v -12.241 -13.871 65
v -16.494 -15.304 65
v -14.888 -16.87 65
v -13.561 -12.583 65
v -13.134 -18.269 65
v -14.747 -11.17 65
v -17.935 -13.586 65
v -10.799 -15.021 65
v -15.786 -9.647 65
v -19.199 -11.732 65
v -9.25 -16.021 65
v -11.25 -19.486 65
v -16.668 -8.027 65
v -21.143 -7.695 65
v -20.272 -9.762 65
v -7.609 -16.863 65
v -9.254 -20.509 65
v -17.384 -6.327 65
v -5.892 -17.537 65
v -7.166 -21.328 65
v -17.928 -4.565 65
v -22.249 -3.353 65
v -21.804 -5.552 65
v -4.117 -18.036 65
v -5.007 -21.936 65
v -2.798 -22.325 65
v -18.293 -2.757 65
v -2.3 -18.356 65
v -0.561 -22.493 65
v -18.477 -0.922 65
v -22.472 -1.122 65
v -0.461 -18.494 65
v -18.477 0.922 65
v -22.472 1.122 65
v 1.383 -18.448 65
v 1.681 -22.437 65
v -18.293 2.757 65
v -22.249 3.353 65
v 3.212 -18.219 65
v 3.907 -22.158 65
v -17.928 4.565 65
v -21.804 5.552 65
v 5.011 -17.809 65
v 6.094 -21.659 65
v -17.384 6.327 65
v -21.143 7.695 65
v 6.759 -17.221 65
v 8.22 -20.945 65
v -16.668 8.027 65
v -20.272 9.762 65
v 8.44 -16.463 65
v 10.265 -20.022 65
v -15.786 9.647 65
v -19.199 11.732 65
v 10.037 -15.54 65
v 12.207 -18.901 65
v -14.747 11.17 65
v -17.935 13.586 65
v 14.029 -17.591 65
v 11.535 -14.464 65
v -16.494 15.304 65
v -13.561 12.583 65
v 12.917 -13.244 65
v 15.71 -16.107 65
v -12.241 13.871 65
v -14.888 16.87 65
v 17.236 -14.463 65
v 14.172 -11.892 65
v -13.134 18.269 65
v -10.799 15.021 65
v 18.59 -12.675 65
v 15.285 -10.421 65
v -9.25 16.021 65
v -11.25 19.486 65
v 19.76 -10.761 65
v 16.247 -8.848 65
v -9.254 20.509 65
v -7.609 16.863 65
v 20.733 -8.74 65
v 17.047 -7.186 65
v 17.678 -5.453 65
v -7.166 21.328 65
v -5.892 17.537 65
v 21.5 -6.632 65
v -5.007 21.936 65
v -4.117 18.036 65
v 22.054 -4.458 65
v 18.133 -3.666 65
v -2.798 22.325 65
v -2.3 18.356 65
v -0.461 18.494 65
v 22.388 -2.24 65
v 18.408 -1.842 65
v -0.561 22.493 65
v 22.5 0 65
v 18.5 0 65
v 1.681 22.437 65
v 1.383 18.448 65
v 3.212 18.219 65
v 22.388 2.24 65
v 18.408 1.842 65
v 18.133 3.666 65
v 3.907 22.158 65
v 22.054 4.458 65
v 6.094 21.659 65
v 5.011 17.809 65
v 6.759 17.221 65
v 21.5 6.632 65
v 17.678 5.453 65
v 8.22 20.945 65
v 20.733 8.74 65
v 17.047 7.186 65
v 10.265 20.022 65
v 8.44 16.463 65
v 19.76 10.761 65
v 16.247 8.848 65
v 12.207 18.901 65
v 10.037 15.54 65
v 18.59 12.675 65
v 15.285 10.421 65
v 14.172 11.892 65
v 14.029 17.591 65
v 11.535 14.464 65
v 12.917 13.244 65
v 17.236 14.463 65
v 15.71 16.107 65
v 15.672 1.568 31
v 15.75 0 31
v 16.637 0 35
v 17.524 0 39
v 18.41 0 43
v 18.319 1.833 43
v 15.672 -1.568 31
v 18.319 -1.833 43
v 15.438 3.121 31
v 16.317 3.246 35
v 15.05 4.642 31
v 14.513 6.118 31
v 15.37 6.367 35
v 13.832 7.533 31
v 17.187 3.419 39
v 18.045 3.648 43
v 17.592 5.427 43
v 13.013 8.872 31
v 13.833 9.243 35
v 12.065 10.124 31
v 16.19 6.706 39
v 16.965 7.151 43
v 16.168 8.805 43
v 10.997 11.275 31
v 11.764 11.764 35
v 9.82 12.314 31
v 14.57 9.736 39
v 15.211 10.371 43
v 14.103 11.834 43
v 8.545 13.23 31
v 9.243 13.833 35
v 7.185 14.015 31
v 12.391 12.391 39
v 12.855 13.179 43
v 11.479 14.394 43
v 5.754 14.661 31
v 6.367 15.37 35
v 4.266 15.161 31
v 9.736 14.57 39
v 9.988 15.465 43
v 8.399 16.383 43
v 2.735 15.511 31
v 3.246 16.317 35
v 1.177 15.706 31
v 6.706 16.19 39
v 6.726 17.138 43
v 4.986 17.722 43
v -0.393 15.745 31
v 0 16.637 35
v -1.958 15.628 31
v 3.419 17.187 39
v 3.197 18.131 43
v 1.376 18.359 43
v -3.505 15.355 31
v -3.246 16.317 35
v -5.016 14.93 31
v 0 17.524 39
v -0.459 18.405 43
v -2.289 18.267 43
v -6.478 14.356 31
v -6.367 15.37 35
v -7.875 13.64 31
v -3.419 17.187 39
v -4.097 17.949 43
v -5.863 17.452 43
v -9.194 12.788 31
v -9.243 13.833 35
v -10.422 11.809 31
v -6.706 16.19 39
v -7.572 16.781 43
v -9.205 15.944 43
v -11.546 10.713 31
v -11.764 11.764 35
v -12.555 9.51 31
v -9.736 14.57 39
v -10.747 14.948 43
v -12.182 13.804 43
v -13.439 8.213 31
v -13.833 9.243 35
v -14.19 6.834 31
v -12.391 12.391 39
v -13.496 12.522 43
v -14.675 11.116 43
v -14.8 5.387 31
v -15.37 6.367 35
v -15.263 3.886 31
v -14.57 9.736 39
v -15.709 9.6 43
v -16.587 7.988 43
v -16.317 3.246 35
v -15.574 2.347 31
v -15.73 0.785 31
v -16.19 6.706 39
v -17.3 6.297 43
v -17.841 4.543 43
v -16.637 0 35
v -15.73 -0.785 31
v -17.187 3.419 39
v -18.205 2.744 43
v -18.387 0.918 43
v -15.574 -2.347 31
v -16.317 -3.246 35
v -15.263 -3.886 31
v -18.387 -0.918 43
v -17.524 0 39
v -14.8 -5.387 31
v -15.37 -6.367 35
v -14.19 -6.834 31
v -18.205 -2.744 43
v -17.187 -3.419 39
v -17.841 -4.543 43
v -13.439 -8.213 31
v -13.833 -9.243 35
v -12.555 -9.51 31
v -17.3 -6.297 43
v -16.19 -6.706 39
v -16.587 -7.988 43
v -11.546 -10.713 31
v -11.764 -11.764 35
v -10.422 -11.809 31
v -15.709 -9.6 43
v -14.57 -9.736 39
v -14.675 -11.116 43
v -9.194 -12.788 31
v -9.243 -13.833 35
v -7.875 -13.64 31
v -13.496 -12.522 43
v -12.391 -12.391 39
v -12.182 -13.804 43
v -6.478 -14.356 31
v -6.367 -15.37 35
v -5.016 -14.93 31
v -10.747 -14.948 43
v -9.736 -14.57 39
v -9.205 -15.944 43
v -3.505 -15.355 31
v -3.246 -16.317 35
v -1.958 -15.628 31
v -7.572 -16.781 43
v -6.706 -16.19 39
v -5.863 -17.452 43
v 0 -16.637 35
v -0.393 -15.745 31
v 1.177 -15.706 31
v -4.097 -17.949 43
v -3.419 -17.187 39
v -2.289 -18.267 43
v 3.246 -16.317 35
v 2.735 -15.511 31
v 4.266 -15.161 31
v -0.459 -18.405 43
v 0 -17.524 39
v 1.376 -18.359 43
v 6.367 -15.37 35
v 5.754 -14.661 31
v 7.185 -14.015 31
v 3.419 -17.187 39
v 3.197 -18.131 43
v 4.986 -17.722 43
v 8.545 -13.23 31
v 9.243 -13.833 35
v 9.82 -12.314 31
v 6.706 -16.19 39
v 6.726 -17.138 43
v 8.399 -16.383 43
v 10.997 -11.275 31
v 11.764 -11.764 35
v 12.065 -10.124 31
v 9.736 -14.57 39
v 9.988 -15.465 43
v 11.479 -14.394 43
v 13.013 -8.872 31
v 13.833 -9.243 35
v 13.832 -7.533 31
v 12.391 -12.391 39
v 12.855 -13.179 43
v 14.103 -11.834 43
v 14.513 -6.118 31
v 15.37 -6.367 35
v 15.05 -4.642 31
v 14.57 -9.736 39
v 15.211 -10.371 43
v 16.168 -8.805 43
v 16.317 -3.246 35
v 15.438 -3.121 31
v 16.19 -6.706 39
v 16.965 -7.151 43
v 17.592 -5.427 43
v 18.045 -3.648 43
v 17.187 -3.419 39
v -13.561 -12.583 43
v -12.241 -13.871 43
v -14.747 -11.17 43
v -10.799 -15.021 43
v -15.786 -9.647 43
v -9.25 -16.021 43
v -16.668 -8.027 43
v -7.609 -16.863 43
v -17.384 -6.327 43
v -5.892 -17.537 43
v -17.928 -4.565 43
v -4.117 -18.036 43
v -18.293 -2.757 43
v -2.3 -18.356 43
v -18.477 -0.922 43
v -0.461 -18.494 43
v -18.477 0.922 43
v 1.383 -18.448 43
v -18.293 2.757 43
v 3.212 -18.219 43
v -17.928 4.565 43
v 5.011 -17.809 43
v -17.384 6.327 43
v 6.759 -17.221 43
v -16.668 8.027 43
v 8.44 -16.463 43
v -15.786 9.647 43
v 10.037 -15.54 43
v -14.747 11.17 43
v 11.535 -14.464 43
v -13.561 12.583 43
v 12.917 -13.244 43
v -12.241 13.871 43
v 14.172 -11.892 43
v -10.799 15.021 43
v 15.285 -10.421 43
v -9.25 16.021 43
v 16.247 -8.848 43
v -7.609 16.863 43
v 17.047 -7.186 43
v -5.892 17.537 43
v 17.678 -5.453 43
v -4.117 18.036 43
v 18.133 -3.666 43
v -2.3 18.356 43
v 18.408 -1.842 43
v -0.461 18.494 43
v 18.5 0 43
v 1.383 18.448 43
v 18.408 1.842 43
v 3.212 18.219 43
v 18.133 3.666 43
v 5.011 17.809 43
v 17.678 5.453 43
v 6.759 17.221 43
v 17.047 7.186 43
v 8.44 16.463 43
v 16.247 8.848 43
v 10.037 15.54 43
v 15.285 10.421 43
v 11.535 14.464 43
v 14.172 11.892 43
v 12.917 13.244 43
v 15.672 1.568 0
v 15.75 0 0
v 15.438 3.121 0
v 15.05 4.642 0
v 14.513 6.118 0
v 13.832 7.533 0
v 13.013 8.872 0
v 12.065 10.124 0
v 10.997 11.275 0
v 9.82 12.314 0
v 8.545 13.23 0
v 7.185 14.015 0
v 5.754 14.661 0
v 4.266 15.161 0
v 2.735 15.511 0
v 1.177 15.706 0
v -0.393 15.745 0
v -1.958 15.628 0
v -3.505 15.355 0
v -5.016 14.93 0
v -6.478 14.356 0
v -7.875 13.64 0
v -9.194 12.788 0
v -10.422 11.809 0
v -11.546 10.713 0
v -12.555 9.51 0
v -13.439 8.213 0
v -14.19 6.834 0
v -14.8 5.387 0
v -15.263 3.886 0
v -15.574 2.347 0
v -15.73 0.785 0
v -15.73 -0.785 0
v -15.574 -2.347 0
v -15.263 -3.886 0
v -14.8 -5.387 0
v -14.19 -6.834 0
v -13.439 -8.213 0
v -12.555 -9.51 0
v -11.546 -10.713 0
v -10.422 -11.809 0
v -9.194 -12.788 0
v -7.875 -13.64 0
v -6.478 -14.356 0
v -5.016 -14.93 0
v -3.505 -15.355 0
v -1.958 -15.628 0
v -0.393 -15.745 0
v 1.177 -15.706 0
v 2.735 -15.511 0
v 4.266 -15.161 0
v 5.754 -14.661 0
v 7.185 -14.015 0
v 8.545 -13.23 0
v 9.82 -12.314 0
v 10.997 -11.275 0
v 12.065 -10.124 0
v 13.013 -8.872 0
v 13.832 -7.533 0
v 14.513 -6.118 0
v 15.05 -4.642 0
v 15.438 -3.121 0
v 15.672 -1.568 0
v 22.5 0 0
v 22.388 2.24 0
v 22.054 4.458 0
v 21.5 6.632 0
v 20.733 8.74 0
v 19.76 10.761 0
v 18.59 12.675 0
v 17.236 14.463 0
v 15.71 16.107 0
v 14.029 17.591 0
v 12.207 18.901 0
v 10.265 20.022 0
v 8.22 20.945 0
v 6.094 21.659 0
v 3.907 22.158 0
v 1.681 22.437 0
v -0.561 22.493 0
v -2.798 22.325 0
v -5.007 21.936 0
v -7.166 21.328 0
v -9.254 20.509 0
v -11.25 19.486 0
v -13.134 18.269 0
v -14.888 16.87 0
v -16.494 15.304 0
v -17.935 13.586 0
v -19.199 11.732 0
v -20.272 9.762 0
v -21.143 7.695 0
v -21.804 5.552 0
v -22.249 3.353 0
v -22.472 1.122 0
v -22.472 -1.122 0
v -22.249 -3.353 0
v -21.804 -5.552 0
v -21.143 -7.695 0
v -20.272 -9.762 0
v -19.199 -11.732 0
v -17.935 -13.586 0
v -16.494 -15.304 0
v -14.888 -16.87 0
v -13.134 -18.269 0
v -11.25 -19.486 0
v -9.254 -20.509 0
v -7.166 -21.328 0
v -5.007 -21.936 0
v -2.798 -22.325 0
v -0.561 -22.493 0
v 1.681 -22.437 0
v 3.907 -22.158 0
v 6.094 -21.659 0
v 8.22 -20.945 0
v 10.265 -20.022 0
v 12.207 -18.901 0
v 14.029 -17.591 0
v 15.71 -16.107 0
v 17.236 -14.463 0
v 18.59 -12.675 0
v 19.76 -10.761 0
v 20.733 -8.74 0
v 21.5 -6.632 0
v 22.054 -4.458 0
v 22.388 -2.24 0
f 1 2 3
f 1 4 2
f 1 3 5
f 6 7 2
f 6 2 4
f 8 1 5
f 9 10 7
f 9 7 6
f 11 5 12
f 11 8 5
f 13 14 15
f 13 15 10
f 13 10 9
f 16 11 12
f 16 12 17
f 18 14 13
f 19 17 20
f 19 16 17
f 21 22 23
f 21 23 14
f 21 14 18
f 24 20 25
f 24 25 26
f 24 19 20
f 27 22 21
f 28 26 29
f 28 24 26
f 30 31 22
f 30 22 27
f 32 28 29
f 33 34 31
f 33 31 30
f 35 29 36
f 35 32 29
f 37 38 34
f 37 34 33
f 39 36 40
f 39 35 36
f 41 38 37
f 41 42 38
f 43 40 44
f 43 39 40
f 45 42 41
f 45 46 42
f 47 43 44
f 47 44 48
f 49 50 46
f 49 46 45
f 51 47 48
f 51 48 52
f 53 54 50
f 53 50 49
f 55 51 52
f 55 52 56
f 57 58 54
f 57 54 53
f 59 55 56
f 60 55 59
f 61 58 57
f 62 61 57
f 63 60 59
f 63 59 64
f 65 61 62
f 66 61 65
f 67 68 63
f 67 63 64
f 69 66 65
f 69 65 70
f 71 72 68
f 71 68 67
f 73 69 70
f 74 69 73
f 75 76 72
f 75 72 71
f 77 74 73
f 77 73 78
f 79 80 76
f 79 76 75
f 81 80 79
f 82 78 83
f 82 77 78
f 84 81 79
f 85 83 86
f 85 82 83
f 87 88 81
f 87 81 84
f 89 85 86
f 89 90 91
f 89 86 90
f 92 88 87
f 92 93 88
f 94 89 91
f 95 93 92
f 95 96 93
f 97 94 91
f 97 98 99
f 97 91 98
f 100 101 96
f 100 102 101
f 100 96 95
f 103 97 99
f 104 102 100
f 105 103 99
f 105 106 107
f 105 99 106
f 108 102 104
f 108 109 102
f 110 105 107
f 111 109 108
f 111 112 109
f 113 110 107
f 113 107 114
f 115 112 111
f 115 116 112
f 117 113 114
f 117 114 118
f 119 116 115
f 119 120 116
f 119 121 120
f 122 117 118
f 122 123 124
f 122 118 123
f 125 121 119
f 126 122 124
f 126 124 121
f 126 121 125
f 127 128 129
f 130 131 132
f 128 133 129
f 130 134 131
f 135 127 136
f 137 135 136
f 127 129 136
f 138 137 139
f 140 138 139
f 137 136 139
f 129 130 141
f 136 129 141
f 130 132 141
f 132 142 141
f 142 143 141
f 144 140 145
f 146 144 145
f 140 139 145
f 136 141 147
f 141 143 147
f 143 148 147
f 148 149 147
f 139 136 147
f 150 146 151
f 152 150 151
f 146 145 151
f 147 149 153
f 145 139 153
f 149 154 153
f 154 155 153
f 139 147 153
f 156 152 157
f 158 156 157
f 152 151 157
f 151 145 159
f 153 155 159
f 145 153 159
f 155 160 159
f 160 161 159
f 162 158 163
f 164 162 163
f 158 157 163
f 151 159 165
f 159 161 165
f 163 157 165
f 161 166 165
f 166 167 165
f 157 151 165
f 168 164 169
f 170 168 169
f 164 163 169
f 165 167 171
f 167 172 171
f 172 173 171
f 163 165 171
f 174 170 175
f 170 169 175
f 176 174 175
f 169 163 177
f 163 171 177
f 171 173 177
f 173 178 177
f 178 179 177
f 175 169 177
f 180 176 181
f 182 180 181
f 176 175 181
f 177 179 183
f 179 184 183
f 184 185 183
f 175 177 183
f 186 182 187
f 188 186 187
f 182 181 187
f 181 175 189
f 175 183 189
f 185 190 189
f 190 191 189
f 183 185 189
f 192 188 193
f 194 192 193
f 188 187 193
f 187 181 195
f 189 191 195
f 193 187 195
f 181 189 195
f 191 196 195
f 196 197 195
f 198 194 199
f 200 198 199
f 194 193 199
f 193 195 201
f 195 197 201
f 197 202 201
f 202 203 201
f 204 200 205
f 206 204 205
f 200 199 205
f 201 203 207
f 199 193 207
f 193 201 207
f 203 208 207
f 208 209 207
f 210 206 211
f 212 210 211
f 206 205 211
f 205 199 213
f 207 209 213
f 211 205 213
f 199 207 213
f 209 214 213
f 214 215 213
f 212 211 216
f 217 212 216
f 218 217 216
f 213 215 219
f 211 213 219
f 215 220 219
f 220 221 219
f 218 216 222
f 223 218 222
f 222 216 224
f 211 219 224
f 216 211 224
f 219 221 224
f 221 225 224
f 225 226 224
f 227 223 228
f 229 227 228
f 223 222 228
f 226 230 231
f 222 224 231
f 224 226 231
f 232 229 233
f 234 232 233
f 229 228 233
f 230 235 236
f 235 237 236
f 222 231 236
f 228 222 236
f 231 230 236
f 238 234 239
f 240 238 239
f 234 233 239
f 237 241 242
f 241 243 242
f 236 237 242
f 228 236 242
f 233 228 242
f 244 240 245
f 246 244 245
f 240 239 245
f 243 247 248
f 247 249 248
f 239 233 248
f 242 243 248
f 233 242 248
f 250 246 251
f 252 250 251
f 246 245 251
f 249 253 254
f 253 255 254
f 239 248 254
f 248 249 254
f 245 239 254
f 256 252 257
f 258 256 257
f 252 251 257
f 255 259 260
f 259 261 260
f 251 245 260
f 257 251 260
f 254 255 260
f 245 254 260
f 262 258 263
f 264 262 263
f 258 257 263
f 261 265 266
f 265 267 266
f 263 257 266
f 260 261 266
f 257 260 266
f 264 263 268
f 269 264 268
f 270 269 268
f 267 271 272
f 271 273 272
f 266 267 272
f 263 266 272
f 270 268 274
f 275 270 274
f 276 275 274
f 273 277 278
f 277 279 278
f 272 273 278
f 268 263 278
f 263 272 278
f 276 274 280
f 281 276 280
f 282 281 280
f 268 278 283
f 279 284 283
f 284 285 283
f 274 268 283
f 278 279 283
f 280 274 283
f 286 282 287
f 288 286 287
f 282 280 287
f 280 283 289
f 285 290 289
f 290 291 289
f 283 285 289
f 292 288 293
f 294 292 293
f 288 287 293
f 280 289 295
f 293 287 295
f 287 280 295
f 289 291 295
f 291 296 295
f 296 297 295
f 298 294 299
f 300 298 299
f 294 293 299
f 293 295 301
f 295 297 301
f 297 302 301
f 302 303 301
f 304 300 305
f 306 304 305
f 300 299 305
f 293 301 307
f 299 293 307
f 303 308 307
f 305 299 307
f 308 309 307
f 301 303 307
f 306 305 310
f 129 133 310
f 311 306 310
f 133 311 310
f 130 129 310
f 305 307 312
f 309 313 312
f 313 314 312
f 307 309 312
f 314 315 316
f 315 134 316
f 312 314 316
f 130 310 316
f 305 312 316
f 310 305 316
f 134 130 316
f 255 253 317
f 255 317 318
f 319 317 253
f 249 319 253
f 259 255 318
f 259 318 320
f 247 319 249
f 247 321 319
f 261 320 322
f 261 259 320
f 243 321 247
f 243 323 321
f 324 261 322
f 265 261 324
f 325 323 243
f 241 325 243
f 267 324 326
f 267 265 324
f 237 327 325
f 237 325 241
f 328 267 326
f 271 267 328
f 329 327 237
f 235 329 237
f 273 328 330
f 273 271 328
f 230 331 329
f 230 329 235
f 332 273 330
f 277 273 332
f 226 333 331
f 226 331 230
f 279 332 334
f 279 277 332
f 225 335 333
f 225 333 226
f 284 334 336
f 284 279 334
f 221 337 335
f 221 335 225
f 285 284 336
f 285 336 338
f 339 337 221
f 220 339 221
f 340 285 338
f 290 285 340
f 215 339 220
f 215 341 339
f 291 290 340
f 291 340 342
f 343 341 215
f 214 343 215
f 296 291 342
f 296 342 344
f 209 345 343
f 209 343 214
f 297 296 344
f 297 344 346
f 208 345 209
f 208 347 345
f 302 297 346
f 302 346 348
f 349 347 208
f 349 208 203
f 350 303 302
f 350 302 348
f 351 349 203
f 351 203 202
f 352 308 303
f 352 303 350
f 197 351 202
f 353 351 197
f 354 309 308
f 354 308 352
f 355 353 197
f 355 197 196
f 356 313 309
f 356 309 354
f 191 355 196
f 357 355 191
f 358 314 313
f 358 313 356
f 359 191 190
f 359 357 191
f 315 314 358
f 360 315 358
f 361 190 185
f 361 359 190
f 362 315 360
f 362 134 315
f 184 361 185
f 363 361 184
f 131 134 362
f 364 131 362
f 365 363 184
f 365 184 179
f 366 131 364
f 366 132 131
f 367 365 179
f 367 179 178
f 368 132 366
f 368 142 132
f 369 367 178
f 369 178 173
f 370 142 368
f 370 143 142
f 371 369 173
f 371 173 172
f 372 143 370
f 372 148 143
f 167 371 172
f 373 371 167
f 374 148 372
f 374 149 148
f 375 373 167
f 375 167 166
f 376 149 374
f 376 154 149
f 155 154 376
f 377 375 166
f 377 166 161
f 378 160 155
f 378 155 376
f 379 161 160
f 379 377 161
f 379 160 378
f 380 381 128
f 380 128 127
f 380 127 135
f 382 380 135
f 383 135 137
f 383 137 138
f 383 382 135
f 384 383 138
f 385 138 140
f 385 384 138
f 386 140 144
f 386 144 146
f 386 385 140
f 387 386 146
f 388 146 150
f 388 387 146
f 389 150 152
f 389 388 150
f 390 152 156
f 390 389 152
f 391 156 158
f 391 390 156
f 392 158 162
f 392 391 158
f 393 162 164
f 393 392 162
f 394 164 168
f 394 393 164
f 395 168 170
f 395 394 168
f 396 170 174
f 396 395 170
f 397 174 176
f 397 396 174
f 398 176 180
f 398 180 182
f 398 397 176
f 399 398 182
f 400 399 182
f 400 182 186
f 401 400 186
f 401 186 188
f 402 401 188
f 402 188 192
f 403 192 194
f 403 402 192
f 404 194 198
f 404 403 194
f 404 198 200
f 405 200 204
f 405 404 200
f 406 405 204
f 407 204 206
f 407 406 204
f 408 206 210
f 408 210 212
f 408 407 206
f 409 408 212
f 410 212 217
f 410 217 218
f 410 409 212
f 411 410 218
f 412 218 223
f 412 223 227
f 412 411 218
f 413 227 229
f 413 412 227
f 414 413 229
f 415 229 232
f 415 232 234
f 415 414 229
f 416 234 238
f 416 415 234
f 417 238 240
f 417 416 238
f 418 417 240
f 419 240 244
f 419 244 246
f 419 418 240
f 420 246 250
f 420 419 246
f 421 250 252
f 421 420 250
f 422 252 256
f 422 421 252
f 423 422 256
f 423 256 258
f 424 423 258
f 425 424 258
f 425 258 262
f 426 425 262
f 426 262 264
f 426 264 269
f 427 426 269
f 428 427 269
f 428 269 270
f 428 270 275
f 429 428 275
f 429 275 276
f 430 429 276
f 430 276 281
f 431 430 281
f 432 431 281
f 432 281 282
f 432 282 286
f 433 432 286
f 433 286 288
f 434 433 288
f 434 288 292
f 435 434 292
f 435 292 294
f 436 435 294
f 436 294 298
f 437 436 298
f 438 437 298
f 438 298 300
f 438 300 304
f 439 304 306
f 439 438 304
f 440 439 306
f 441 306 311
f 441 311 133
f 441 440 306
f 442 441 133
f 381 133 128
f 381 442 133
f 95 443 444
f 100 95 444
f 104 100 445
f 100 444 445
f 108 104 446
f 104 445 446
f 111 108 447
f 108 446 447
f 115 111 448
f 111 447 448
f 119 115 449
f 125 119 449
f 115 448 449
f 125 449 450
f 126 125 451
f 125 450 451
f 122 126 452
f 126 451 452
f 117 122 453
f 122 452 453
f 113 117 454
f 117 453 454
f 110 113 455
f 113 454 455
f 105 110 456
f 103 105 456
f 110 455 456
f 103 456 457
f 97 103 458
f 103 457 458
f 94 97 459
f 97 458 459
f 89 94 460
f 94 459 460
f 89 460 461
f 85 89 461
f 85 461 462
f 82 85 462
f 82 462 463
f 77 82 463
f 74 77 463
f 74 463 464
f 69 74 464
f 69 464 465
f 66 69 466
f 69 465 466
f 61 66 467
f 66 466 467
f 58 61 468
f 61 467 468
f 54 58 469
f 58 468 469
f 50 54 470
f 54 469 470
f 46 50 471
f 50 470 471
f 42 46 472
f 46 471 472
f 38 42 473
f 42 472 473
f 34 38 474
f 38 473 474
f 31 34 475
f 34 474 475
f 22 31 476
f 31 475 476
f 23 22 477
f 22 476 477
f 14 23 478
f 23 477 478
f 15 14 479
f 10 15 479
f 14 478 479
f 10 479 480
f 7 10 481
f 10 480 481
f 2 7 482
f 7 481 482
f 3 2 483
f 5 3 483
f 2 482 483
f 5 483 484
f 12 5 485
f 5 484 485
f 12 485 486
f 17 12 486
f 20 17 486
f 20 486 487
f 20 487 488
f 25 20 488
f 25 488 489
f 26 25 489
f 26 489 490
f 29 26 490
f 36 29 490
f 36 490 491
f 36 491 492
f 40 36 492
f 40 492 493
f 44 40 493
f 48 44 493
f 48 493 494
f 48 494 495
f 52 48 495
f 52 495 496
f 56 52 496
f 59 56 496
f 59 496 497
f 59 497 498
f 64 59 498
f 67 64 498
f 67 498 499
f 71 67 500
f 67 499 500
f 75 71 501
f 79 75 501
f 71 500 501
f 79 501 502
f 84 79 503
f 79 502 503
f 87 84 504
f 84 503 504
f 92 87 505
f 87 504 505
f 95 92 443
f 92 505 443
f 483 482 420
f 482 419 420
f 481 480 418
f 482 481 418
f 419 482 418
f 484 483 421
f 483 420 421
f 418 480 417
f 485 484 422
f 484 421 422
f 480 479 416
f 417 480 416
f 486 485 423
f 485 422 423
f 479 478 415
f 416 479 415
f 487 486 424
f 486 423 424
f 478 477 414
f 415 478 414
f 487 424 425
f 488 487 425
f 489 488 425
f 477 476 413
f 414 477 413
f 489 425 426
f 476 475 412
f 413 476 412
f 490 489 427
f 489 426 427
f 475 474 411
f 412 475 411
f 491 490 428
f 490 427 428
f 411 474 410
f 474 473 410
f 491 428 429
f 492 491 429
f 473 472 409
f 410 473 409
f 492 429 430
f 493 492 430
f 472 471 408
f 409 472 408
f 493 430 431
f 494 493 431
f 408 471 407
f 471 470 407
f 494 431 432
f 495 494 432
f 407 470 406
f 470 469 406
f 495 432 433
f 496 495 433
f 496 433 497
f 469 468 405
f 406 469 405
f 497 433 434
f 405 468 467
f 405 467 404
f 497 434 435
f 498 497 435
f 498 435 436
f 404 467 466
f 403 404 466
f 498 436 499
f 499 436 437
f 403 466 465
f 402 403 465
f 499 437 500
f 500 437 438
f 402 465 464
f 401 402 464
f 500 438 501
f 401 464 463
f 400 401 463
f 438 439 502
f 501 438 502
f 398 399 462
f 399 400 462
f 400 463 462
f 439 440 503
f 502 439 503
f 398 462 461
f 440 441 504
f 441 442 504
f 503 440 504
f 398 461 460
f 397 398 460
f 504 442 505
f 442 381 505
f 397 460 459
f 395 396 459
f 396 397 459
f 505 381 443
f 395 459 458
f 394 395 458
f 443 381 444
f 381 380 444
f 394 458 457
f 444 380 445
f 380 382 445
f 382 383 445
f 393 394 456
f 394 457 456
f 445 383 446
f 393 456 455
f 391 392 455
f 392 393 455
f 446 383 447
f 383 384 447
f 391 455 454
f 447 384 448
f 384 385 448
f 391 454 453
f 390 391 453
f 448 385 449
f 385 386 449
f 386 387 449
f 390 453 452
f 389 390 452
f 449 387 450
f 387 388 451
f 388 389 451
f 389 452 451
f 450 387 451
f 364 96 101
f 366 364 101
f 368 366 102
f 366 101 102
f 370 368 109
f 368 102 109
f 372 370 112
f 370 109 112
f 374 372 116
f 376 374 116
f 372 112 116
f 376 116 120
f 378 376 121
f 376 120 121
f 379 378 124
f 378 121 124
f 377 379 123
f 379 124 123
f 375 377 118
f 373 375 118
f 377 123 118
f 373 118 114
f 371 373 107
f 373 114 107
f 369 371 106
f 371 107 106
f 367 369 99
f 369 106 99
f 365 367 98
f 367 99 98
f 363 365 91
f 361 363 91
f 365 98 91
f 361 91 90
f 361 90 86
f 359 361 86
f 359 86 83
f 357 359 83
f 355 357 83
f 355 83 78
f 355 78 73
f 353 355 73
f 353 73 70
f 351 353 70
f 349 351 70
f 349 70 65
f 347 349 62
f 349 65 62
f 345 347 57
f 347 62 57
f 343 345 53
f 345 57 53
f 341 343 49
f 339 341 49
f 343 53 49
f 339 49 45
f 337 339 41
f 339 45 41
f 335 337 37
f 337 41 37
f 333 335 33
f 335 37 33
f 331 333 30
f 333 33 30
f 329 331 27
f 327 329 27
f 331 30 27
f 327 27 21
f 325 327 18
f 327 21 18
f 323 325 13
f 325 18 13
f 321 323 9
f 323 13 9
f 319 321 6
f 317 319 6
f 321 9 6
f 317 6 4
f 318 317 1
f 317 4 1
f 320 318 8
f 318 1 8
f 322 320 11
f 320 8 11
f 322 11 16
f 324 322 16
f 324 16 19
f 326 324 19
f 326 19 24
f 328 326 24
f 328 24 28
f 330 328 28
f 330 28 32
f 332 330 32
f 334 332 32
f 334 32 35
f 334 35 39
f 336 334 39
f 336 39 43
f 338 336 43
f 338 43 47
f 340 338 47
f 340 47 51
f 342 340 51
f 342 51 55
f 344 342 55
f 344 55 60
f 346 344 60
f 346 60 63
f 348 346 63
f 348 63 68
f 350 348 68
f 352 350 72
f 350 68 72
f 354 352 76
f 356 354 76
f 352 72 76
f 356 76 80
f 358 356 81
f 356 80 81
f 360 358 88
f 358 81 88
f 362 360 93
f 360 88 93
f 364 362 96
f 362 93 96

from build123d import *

# Parameters (mm, degrees)
SKETCH_R        = 22.5
PAD_DEPTH       = 65
SKETCH001_R     = 18.5
POCKET_DEPTH    = 22
SKETCH002_R     = 15.75
POCKET001_DEPTH = 43
CHAMFER_ANGLE   = 12.5
CHAMFER_SIZE    = 12


with BuildPart() as part:
    # Sketch → Pad (new body)
    with BuildSketch(Plane.XY):
        Circle(SKETCH_R)
    extrude(amount=PAD_DEPTH)

    # Sketch001 → Pocket (cut)
    with BuildSketch(Plane.XY.offset(65)):
        Circle(SKETCH001_R)
    extrude(amount=-POCKET_DEPTH, mode=Mode.SUBTRACT)

    # Sketch002 → Pocket001 (cut)
    with BuildSketch(Plane.XY):
        Circle(SKETCH002_R)
    extrude(amount=POCKET001_DEPTH, mode=Mode.SUBTRACT)

    # Chamfer
    chamfer_edges = [part.edges().sort_by_distance(p)[0] for p in [
        (-15.75, 0, 43),
    ]]
    chamfer_side = part.faces().sort_by_distance((-15.75, 0, 21.5))[0]
    chamfer(chamfer_edges, length=CHAMFER_SIZE, angle=CHAMFER_ANGLE, reference=chamfer_side)


solid = part.part
